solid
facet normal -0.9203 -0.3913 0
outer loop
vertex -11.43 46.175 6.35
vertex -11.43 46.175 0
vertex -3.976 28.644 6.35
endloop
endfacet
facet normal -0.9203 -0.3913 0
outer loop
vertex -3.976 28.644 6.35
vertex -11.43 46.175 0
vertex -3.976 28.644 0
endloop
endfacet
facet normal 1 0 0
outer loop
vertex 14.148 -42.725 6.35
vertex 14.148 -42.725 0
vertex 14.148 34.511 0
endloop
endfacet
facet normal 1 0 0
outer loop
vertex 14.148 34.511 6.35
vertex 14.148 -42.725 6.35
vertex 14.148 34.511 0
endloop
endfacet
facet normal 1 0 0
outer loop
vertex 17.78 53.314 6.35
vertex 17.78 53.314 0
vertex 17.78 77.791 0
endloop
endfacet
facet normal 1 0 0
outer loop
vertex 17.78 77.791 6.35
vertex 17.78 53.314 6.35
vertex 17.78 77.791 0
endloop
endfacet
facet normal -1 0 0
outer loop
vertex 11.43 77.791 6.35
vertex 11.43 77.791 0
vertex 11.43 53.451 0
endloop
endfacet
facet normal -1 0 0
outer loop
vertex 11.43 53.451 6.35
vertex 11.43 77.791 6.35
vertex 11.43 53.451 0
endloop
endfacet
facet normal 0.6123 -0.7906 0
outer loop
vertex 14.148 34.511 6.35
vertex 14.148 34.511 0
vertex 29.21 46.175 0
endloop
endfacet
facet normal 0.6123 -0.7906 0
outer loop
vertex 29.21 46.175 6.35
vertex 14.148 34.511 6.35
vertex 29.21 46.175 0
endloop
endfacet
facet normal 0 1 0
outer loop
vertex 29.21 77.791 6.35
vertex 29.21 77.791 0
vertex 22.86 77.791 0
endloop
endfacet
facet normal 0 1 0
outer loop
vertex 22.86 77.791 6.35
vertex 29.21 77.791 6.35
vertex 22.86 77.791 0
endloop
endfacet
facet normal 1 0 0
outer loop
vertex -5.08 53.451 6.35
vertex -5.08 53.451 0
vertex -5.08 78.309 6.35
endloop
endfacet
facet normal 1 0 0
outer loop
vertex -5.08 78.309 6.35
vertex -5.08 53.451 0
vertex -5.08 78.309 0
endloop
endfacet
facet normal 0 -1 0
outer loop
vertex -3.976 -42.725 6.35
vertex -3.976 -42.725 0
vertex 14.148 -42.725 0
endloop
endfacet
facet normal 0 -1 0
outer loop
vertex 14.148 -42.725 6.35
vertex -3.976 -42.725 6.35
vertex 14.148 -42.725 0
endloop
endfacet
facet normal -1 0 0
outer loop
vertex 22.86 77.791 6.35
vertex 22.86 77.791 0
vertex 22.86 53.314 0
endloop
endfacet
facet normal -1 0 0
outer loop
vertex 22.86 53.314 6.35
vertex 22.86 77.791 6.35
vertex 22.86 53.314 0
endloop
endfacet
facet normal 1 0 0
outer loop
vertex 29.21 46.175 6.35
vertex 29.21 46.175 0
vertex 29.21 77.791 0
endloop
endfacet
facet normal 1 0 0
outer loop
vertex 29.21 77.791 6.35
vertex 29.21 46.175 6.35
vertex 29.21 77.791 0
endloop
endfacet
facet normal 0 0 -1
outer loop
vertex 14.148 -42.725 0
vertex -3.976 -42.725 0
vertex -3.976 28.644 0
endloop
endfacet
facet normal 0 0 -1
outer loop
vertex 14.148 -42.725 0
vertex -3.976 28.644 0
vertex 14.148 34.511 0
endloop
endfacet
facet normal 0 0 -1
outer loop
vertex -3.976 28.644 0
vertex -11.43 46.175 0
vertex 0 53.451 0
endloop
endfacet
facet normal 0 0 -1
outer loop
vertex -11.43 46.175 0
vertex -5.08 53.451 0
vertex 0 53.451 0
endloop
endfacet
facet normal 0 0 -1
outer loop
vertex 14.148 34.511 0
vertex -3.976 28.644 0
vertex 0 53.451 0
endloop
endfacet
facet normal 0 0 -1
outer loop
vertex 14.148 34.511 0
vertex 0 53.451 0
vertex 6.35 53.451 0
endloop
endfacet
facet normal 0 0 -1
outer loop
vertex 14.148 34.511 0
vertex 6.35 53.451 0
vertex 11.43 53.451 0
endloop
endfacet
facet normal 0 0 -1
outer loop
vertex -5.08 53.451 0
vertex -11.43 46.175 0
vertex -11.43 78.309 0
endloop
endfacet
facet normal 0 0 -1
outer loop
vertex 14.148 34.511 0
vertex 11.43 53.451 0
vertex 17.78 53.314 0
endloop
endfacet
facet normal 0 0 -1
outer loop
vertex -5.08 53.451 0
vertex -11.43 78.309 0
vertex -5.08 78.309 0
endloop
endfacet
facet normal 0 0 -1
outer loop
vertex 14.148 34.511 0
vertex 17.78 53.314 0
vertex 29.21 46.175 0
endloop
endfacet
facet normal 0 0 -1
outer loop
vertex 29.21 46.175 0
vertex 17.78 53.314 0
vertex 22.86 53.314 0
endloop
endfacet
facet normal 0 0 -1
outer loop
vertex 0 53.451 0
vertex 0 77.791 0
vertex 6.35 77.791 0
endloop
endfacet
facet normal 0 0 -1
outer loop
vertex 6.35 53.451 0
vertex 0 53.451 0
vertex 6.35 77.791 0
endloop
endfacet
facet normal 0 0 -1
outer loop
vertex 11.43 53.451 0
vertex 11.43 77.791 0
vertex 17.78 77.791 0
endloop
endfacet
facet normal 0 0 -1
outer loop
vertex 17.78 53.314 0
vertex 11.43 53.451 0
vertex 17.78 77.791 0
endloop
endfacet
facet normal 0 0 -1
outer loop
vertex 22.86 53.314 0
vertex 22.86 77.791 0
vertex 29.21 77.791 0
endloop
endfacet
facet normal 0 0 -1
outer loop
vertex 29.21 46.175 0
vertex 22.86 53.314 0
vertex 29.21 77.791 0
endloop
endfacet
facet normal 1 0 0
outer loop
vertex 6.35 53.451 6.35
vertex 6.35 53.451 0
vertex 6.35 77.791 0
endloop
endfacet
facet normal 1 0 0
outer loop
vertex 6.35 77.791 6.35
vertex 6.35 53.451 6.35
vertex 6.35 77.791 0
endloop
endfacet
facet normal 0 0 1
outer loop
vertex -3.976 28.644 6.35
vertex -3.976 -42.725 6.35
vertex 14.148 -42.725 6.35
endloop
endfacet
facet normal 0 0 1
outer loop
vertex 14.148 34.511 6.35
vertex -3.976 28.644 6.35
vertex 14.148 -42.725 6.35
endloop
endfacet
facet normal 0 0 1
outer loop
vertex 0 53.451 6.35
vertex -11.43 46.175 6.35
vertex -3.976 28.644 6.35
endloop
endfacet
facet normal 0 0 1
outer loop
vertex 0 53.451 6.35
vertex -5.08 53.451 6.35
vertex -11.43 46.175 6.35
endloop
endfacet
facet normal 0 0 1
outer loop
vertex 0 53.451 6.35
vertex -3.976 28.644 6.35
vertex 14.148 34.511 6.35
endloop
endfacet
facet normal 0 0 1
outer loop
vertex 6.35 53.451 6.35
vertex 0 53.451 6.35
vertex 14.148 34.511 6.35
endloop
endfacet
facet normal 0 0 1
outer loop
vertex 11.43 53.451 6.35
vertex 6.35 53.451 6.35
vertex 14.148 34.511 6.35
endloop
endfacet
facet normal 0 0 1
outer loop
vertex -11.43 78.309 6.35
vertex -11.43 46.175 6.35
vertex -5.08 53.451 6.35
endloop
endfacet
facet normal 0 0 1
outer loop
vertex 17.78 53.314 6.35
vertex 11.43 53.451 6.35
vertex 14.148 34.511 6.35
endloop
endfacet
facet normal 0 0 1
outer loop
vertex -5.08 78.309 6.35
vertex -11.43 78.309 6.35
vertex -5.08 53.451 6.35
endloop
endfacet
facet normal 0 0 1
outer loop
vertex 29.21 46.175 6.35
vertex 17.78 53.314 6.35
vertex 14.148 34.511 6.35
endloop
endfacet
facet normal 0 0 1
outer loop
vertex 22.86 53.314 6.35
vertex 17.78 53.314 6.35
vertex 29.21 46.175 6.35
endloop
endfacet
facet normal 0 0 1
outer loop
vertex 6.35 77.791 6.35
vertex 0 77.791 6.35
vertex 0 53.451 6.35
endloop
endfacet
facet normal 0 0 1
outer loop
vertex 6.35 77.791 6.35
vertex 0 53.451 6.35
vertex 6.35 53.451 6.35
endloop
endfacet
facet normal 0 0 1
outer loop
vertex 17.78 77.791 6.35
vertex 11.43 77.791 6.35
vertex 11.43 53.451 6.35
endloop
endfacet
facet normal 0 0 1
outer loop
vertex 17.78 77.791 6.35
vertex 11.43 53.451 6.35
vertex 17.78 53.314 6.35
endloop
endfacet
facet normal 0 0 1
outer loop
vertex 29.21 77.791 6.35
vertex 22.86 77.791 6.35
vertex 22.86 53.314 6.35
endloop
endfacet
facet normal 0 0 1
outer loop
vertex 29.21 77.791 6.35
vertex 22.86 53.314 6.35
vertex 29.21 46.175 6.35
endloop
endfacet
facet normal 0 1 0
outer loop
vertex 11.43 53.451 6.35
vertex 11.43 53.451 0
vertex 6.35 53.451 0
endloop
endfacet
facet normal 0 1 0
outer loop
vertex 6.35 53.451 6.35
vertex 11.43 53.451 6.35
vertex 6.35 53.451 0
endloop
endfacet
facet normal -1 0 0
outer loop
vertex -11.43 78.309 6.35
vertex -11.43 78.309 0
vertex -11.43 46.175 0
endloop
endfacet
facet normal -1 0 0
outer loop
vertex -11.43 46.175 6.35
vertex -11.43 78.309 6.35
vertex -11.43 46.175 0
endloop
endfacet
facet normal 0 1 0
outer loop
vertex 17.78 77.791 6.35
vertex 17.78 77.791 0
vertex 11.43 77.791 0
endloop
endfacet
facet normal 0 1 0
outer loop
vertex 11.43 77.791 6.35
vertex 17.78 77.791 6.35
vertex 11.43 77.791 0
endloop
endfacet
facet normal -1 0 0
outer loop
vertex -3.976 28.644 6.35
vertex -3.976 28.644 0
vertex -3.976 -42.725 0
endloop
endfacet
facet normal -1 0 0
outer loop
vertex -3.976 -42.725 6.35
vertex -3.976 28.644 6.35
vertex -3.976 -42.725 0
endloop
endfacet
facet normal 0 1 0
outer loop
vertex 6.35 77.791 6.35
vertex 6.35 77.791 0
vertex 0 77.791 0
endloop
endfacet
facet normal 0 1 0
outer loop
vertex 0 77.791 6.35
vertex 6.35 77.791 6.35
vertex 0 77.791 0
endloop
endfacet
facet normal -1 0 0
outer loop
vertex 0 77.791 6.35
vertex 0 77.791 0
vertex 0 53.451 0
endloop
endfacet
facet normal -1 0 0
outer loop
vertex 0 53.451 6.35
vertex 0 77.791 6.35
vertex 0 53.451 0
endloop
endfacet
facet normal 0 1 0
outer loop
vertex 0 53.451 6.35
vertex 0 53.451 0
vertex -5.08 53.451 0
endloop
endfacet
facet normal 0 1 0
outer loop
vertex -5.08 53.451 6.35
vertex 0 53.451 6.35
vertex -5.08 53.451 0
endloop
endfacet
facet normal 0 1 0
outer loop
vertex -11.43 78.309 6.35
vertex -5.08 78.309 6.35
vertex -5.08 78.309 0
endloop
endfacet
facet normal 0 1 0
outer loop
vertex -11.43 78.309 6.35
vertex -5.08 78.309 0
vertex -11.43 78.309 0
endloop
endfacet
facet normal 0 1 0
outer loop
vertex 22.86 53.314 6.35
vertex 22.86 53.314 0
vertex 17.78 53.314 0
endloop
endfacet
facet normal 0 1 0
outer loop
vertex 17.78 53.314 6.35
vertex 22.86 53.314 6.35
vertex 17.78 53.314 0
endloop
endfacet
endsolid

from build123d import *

# Parameters (mm, degrees)
F1_DEPTH = 6.35


with BuildPart() as f1:
    # F0 (on Top) → F1 (new body)
    with BuildSketch(Plane.XY):
        Polygon((-3.97574, 28.643733), (-3.97574, -42.725251), (14.148261, -42.725251), (14.148261, 34.510851), (29.21, 46.174749), (29.21, 77.791074), (22.86, 77.791074), (22.86, 53.314248), (17.78, 53.314248), (17.78, 77.791074), (11.43, 77.791074), (11.43, 53.450988), (6.35, 53.450988), (6.35, 77.791074), (0, 77.791074), (0, 53.450988), (-5.08, 53.450988), (-5.08, 78.309131), (-11.43, 78.309131), (-11.43, 46.174749), align=None)
    extrude(amount=F1_DEPTH)


solid = f1.part
